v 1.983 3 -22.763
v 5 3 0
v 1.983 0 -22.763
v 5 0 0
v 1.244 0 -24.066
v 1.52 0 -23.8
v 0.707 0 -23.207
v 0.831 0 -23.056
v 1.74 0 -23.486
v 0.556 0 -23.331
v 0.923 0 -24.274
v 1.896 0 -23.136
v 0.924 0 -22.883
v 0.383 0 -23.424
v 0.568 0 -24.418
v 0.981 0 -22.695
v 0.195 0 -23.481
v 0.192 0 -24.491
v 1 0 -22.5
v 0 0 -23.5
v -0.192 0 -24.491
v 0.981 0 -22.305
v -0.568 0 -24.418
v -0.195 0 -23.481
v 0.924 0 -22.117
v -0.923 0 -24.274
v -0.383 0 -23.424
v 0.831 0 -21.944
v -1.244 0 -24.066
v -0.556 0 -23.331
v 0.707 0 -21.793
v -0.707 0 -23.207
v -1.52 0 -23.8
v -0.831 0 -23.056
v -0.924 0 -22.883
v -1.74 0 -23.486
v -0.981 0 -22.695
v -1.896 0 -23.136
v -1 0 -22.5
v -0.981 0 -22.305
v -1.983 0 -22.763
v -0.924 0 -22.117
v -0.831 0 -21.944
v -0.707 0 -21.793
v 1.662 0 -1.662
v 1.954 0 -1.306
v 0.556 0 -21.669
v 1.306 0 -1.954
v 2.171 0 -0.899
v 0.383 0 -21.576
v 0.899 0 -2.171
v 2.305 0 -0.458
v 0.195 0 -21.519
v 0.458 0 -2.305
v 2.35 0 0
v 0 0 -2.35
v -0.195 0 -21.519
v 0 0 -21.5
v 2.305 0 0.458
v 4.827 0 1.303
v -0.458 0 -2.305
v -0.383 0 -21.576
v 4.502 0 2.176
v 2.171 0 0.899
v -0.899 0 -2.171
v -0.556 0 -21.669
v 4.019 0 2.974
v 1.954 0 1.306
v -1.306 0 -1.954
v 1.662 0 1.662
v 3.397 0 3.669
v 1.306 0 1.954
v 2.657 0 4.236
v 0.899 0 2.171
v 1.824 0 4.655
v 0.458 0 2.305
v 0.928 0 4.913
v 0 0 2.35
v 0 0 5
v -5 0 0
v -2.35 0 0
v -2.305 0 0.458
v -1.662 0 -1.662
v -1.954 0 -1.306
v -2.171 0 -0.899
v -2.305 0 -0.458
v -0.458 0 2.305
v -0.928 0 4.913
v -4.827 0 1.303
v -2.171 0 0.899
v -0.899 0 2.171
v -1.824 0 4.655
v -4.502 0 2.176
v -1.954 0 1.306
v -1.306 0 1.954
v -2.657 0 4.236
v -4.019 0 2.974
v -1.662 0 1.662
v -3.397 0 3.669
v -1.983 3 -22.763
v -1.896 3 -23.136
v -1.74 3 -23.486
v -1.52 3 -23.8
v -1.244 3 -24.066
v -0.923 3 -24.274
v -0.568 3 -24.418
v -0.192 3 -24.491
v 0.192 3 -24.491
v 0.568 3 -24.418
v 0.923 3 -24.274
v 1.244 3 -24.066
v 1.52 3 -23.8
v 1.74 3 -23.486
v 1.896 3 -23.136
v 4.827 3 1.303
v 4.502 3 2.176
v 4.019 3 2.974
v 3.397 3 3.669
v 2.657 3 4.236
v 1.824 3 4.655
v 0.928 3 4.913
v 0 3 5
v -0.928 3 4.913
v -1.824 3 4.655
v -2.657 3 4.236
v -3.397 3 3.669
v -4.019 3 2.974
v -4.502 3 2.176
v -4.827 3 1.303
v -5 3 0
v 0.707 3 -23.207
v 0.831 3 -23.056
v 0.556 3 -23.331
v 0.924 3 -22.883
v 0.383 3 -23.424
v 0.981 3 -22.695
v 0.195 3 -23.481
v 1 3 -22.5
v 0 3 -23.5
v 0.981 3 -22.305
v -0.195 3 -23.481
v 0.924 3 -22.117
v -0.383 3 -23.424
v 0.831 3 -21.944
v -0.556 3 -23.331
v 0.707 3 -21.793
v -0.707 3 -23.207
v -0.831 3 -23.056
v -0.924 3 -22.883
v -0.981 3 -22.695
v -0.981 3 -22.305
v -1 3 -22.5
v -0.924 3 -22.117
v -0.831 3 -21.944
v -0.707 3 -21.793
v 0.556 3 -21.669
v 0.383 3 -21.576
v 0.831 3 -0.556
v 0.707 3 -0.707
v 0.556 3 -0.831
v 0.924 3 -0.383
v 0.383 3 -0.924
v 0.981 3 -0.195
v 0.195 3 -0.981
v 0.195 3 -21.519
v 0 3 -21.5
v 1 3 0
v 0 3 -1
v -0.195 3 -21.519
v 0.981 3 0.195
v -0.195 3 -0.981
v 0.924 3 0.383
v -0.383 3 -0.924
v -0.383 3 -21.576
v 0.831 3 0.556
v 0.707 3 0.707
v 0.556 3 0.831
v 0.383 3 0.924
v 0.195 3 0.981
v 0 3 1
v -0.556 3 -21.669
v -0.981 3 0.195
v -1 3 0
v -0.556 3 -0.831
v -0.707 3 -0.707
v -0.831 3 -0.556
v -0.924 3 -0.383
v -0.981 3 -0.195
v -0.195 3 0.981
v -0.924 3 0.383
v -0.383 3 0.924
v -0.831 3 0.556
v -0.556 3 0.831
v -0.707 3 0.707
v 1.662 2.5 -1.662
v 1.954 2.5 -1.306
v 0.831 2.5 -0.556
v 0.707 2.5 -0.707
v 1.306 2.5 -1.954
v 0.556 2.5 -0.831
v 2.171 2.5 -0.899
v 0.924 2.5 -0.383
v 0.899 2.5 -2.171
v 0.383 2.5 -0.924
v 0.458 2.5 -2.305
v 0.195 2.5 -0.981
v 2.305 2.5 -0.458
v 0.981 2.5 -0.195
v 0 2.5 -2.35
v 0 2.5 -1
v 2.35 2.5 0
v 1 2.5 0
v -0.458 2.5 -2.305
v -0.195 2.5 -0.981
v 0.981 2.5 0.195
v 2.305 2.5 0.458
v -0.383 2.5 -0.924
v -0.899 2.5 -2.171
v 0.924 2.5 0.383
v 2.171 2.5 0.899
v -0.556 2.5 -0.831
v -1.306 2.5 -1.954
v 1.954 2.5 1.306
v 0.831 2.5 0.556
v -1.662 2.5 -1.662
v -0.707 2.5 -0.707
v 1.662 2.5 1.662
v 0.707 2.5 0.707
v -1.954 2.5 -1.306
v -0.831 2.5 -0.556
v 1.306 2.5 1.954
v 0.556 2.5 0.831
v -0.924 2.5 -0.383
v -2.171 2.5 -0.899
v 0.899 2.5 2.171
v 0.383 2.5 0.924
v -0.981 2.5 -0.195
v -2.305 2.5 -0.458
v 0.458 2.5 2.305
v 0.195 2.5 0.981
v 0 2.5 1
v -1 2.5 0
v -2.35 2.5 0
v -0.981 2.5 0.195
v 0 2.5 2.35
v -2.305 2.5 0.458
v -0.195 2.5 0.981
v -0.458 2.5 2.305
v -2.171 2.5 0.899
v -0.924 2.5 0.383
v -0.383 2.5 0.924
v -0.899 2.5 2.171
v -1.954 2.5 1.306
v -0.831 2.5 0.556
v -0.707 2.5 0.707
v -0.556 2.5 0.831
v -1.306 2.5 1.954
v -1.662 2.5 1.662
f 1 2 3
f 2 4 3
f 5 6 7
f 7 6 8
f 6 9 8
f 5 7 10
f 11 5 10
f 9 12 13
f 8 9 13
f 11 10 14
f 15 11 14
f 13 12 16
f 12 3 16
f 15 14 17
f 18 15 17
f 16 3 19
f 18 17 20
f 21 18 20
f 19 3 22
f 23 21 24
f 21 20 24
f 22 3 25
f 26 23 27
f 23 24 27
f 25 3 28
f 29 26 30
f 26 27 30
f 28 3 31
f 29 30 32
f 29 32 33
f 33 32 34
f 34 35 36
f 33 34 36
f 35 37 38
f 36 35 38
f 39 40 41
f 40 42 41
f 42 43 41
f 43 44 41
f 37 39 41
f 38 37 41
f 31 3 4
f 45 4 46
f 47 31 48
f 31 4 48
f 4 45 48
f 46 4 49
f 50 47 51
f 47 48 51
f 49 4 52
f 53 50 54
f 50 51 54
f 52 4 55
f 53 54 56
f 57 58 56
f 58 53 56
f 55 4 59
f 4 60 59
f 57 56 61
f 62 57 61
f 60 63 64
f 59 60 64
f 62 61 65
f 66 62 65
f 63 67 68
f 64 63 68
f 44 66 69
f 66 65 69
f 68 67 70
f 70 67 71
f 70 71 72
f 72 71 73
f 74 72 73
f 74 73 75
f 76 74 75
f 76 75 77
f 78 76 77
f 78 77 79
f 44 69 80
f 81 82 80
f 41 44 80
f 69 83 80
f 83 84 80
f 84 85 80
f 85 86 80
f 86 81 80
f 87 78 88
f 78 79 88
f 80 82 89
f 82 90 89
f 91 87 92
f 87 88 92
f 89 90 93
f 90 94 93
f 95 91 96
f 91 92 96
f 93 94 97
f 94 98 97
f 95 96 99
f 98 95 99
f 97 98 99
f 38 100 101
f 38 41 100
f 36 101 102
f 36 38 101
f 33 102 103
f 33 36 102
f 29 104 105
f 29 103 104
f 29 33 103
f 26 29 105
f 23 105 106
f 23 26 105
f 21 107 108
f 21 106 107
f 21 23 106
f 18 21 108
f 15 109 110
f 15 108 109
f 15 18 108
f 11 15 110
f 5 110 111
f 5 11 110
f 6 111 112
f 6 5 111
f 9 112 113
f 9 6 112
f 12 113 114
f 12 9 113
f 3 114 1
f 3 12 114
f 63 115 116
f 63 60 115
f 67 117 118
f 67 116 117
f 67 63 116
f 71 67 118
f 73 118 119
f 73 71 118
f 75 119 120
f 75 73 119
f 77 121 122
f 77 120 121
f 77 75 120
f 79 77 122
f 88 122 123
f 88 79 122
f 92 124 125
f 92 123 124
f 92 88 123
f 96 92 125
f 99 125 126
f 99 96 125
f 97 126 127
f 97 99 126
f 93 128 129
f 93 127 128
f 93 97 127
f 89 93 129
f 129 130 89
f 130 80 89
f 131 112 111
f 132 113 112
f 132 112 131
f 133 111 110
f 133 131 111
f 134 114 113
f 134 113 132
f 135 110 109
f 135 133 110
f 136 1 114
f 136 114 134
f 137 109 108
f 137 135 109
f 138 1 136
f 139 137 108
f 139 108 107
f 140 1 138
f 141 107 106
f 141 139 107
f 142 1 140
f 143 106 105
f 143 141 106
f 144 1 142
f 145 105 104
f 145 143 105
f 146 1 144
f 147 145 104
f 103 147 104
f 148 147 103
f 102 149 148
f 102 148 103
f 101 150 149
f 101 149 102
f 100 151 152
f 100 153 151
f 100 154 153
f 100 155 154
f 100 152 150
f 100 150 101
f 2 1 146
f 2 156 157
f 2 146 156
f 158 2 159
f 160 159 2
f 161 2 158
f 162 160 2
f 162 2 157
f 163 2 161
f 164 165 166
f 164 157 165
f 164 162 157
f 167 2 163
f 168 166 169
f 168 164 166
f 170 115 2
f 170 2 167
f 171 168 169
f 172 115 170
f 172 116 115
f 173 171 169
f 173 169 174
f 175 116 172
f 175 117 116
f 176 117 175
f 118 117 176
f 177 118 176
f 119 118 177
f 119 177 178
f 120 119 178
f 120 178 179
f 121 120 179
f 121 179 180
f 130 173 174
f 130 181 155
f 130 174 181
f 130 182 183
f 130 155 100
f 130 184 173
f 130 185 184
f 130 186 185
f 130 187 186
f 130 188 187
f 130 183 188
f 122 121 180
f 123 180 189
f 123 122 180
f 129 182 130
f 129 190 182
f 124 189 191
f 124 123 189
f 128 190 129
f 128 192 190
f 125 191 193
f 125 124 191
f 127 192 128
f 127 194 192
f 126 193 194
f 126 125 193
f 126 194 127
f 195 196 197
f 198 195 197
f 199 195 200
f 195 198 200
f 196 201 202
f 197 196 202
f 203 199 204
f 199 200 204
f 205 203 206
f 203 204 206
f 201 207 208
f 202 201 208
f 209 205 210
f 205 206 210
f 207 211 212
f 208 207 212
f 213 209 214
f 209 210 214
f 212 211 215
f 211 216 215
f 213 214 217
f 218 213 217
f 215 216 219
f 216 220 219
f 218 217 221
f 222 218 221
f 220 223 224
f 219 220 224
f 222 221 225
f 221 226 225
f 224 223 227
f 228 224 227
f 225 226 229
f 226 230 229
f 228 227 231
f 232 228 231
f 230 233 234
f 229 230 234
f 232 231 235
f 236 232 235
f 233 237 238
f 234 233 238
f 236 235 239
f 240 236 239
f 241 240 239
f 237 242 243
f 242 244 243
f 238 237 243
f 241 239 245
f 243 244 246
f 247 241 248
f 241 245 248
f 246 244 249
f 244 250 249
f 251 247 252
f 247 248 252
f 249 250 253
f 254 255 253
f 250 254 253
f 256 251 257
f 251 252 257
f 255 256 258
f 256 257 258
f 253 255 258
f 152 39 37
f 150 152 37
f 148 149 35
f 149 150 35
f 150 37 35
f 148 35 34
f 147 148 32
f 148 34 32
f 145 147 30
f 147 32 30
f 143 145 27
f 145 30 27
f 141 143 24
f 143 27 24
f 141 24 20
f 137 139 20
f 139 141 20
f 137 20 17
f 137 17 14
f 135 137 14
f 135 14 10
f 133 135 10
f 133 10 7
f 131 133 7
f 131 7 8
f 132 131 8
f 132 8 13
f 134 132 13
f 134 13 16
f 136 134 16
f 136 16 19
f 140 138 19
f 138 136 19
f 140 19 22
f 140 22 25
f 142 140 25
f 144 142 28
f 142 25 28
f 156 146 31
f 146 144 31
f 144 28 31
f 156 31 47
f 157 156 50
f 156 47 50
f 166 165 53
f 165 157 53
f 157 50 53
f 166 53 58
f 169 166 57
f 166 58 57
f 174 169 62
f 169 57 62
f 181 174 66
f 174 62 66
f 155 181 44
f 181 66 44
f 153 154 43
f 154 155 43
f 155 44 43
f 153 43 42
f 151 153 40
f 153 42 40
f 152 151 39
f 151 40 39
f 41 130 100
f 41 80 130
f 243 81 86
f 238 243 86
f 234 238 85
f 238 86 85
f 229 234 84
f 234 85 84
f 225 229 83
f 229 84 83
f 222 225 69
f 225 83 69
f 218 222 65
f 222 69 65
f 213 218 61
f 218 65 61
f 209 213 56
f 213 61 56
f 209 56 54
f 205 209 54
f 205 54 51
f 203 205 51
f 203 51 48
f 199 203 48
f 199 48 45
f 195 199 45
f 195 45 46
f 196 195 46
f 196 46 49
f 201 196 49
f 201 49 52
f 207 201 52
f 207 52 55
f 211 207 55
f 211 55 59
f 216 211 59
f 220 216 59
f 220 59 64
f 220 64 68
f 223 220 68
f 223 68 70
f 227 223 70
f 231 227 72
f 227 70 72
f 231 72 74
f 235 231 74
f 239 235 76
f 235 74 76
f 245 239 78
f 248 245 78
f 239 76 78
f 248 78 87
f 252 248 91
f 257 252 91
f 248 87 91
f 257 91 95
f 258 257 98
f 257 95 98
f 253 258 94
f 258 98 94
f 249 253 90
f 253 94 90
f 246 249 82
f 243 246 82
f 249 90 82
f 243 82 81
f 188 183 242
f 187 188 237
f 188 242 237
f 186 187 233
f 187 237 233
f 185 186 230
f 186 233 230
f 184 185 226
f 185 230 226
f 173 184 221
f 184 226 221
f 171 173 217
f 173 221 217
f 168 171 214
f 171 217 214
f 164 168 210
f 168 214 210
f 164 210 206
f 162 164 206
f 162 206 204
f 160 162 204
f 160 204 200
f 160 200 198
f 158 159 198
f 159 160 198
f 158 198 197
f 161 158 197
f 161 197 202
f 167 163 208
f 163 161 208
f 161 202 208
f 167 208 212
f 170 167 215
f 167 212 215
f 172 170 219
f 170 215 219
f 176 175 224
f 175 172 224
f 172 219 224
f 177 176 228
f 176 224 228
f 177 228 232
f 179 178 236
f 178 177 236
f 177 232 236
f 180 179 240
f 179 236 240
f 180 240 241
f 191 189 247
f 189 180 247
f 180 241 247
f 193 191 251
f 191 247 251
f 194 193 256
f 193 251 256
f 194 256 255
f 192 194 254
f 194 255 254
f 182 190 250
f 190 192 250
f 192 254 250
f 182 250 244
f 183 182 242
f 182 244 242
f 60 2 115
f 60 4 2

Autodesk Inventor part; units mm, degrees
ref_plane "YZ Plane" through (0, 0, 0) normal (1, 0, 0) x (0, 1, 0)
ref_plane "XZ Plane" through (0, 0, 0) normal (0, 1, 0) x (-1, 0, 0)
ref_plane "XY Plane" through (0, 0, 0) normal (0, 0, 1) x (1, 0, 0)
sketch "Sketch1" plane through (0, 0, 0) normal (0, 1, 0) x (-1, 0, 0)
  circle A0 centre (0, 0) radius 2.35
  line L0 (0, 0) -> (0, -22.5)
  circle A1 centre (0, -22.5) radius 1
  circle A2 centre (0, 22.5) radius 1
  circle A3 centre (0, -22.5) radius 2
  circle A4 centre (0, 22.5) radius 2
  circle A5 centre (0, 0) radius 5
  line L1 (5, 0) -> (4.8273, 1.3027)
  line L2 (-5, 0) -> (-4.8273, 1.3027)
  line L3 (-5, 0) -> (-1.9827, -22.7628)
  line L4 (5, 0) -> (1.9827, -22.7628)
  circle A6 centre (0, 0) radius 1
  line L5 (0, 0) -> (0, 5)
  line L6 (0, 20.5) -> (0, 22.5)
  dimension "d6" = 4
  dimension "d0" = 4.7
  dimension "d1" = 22.5
  dimension "d2" = 22.5
  dimension "d3" = 2
  dimension "d4" = 2
  dimension "d5" = 4
  dimension "d7" = 10
  dimension "d8" = 2
extrude "Extrusion3" add sketch "Sketch1" along normal blind 3 contours A0 L0 A6 L5 | A0 L5 A5 L1 L4 L0 | L5 A6 L0 A0 | A0 L0 A5 L3 L2 L5 | A5 L4 A3 L0 | L0 A3 L3 A5 | A3
extrude "Extrusion4" cut sketch "Sketch1" along normal blind 2.5 contours A0 L0 A6 L5 | L5 A6 L0 A0
properties part number "ServoYAxis"
